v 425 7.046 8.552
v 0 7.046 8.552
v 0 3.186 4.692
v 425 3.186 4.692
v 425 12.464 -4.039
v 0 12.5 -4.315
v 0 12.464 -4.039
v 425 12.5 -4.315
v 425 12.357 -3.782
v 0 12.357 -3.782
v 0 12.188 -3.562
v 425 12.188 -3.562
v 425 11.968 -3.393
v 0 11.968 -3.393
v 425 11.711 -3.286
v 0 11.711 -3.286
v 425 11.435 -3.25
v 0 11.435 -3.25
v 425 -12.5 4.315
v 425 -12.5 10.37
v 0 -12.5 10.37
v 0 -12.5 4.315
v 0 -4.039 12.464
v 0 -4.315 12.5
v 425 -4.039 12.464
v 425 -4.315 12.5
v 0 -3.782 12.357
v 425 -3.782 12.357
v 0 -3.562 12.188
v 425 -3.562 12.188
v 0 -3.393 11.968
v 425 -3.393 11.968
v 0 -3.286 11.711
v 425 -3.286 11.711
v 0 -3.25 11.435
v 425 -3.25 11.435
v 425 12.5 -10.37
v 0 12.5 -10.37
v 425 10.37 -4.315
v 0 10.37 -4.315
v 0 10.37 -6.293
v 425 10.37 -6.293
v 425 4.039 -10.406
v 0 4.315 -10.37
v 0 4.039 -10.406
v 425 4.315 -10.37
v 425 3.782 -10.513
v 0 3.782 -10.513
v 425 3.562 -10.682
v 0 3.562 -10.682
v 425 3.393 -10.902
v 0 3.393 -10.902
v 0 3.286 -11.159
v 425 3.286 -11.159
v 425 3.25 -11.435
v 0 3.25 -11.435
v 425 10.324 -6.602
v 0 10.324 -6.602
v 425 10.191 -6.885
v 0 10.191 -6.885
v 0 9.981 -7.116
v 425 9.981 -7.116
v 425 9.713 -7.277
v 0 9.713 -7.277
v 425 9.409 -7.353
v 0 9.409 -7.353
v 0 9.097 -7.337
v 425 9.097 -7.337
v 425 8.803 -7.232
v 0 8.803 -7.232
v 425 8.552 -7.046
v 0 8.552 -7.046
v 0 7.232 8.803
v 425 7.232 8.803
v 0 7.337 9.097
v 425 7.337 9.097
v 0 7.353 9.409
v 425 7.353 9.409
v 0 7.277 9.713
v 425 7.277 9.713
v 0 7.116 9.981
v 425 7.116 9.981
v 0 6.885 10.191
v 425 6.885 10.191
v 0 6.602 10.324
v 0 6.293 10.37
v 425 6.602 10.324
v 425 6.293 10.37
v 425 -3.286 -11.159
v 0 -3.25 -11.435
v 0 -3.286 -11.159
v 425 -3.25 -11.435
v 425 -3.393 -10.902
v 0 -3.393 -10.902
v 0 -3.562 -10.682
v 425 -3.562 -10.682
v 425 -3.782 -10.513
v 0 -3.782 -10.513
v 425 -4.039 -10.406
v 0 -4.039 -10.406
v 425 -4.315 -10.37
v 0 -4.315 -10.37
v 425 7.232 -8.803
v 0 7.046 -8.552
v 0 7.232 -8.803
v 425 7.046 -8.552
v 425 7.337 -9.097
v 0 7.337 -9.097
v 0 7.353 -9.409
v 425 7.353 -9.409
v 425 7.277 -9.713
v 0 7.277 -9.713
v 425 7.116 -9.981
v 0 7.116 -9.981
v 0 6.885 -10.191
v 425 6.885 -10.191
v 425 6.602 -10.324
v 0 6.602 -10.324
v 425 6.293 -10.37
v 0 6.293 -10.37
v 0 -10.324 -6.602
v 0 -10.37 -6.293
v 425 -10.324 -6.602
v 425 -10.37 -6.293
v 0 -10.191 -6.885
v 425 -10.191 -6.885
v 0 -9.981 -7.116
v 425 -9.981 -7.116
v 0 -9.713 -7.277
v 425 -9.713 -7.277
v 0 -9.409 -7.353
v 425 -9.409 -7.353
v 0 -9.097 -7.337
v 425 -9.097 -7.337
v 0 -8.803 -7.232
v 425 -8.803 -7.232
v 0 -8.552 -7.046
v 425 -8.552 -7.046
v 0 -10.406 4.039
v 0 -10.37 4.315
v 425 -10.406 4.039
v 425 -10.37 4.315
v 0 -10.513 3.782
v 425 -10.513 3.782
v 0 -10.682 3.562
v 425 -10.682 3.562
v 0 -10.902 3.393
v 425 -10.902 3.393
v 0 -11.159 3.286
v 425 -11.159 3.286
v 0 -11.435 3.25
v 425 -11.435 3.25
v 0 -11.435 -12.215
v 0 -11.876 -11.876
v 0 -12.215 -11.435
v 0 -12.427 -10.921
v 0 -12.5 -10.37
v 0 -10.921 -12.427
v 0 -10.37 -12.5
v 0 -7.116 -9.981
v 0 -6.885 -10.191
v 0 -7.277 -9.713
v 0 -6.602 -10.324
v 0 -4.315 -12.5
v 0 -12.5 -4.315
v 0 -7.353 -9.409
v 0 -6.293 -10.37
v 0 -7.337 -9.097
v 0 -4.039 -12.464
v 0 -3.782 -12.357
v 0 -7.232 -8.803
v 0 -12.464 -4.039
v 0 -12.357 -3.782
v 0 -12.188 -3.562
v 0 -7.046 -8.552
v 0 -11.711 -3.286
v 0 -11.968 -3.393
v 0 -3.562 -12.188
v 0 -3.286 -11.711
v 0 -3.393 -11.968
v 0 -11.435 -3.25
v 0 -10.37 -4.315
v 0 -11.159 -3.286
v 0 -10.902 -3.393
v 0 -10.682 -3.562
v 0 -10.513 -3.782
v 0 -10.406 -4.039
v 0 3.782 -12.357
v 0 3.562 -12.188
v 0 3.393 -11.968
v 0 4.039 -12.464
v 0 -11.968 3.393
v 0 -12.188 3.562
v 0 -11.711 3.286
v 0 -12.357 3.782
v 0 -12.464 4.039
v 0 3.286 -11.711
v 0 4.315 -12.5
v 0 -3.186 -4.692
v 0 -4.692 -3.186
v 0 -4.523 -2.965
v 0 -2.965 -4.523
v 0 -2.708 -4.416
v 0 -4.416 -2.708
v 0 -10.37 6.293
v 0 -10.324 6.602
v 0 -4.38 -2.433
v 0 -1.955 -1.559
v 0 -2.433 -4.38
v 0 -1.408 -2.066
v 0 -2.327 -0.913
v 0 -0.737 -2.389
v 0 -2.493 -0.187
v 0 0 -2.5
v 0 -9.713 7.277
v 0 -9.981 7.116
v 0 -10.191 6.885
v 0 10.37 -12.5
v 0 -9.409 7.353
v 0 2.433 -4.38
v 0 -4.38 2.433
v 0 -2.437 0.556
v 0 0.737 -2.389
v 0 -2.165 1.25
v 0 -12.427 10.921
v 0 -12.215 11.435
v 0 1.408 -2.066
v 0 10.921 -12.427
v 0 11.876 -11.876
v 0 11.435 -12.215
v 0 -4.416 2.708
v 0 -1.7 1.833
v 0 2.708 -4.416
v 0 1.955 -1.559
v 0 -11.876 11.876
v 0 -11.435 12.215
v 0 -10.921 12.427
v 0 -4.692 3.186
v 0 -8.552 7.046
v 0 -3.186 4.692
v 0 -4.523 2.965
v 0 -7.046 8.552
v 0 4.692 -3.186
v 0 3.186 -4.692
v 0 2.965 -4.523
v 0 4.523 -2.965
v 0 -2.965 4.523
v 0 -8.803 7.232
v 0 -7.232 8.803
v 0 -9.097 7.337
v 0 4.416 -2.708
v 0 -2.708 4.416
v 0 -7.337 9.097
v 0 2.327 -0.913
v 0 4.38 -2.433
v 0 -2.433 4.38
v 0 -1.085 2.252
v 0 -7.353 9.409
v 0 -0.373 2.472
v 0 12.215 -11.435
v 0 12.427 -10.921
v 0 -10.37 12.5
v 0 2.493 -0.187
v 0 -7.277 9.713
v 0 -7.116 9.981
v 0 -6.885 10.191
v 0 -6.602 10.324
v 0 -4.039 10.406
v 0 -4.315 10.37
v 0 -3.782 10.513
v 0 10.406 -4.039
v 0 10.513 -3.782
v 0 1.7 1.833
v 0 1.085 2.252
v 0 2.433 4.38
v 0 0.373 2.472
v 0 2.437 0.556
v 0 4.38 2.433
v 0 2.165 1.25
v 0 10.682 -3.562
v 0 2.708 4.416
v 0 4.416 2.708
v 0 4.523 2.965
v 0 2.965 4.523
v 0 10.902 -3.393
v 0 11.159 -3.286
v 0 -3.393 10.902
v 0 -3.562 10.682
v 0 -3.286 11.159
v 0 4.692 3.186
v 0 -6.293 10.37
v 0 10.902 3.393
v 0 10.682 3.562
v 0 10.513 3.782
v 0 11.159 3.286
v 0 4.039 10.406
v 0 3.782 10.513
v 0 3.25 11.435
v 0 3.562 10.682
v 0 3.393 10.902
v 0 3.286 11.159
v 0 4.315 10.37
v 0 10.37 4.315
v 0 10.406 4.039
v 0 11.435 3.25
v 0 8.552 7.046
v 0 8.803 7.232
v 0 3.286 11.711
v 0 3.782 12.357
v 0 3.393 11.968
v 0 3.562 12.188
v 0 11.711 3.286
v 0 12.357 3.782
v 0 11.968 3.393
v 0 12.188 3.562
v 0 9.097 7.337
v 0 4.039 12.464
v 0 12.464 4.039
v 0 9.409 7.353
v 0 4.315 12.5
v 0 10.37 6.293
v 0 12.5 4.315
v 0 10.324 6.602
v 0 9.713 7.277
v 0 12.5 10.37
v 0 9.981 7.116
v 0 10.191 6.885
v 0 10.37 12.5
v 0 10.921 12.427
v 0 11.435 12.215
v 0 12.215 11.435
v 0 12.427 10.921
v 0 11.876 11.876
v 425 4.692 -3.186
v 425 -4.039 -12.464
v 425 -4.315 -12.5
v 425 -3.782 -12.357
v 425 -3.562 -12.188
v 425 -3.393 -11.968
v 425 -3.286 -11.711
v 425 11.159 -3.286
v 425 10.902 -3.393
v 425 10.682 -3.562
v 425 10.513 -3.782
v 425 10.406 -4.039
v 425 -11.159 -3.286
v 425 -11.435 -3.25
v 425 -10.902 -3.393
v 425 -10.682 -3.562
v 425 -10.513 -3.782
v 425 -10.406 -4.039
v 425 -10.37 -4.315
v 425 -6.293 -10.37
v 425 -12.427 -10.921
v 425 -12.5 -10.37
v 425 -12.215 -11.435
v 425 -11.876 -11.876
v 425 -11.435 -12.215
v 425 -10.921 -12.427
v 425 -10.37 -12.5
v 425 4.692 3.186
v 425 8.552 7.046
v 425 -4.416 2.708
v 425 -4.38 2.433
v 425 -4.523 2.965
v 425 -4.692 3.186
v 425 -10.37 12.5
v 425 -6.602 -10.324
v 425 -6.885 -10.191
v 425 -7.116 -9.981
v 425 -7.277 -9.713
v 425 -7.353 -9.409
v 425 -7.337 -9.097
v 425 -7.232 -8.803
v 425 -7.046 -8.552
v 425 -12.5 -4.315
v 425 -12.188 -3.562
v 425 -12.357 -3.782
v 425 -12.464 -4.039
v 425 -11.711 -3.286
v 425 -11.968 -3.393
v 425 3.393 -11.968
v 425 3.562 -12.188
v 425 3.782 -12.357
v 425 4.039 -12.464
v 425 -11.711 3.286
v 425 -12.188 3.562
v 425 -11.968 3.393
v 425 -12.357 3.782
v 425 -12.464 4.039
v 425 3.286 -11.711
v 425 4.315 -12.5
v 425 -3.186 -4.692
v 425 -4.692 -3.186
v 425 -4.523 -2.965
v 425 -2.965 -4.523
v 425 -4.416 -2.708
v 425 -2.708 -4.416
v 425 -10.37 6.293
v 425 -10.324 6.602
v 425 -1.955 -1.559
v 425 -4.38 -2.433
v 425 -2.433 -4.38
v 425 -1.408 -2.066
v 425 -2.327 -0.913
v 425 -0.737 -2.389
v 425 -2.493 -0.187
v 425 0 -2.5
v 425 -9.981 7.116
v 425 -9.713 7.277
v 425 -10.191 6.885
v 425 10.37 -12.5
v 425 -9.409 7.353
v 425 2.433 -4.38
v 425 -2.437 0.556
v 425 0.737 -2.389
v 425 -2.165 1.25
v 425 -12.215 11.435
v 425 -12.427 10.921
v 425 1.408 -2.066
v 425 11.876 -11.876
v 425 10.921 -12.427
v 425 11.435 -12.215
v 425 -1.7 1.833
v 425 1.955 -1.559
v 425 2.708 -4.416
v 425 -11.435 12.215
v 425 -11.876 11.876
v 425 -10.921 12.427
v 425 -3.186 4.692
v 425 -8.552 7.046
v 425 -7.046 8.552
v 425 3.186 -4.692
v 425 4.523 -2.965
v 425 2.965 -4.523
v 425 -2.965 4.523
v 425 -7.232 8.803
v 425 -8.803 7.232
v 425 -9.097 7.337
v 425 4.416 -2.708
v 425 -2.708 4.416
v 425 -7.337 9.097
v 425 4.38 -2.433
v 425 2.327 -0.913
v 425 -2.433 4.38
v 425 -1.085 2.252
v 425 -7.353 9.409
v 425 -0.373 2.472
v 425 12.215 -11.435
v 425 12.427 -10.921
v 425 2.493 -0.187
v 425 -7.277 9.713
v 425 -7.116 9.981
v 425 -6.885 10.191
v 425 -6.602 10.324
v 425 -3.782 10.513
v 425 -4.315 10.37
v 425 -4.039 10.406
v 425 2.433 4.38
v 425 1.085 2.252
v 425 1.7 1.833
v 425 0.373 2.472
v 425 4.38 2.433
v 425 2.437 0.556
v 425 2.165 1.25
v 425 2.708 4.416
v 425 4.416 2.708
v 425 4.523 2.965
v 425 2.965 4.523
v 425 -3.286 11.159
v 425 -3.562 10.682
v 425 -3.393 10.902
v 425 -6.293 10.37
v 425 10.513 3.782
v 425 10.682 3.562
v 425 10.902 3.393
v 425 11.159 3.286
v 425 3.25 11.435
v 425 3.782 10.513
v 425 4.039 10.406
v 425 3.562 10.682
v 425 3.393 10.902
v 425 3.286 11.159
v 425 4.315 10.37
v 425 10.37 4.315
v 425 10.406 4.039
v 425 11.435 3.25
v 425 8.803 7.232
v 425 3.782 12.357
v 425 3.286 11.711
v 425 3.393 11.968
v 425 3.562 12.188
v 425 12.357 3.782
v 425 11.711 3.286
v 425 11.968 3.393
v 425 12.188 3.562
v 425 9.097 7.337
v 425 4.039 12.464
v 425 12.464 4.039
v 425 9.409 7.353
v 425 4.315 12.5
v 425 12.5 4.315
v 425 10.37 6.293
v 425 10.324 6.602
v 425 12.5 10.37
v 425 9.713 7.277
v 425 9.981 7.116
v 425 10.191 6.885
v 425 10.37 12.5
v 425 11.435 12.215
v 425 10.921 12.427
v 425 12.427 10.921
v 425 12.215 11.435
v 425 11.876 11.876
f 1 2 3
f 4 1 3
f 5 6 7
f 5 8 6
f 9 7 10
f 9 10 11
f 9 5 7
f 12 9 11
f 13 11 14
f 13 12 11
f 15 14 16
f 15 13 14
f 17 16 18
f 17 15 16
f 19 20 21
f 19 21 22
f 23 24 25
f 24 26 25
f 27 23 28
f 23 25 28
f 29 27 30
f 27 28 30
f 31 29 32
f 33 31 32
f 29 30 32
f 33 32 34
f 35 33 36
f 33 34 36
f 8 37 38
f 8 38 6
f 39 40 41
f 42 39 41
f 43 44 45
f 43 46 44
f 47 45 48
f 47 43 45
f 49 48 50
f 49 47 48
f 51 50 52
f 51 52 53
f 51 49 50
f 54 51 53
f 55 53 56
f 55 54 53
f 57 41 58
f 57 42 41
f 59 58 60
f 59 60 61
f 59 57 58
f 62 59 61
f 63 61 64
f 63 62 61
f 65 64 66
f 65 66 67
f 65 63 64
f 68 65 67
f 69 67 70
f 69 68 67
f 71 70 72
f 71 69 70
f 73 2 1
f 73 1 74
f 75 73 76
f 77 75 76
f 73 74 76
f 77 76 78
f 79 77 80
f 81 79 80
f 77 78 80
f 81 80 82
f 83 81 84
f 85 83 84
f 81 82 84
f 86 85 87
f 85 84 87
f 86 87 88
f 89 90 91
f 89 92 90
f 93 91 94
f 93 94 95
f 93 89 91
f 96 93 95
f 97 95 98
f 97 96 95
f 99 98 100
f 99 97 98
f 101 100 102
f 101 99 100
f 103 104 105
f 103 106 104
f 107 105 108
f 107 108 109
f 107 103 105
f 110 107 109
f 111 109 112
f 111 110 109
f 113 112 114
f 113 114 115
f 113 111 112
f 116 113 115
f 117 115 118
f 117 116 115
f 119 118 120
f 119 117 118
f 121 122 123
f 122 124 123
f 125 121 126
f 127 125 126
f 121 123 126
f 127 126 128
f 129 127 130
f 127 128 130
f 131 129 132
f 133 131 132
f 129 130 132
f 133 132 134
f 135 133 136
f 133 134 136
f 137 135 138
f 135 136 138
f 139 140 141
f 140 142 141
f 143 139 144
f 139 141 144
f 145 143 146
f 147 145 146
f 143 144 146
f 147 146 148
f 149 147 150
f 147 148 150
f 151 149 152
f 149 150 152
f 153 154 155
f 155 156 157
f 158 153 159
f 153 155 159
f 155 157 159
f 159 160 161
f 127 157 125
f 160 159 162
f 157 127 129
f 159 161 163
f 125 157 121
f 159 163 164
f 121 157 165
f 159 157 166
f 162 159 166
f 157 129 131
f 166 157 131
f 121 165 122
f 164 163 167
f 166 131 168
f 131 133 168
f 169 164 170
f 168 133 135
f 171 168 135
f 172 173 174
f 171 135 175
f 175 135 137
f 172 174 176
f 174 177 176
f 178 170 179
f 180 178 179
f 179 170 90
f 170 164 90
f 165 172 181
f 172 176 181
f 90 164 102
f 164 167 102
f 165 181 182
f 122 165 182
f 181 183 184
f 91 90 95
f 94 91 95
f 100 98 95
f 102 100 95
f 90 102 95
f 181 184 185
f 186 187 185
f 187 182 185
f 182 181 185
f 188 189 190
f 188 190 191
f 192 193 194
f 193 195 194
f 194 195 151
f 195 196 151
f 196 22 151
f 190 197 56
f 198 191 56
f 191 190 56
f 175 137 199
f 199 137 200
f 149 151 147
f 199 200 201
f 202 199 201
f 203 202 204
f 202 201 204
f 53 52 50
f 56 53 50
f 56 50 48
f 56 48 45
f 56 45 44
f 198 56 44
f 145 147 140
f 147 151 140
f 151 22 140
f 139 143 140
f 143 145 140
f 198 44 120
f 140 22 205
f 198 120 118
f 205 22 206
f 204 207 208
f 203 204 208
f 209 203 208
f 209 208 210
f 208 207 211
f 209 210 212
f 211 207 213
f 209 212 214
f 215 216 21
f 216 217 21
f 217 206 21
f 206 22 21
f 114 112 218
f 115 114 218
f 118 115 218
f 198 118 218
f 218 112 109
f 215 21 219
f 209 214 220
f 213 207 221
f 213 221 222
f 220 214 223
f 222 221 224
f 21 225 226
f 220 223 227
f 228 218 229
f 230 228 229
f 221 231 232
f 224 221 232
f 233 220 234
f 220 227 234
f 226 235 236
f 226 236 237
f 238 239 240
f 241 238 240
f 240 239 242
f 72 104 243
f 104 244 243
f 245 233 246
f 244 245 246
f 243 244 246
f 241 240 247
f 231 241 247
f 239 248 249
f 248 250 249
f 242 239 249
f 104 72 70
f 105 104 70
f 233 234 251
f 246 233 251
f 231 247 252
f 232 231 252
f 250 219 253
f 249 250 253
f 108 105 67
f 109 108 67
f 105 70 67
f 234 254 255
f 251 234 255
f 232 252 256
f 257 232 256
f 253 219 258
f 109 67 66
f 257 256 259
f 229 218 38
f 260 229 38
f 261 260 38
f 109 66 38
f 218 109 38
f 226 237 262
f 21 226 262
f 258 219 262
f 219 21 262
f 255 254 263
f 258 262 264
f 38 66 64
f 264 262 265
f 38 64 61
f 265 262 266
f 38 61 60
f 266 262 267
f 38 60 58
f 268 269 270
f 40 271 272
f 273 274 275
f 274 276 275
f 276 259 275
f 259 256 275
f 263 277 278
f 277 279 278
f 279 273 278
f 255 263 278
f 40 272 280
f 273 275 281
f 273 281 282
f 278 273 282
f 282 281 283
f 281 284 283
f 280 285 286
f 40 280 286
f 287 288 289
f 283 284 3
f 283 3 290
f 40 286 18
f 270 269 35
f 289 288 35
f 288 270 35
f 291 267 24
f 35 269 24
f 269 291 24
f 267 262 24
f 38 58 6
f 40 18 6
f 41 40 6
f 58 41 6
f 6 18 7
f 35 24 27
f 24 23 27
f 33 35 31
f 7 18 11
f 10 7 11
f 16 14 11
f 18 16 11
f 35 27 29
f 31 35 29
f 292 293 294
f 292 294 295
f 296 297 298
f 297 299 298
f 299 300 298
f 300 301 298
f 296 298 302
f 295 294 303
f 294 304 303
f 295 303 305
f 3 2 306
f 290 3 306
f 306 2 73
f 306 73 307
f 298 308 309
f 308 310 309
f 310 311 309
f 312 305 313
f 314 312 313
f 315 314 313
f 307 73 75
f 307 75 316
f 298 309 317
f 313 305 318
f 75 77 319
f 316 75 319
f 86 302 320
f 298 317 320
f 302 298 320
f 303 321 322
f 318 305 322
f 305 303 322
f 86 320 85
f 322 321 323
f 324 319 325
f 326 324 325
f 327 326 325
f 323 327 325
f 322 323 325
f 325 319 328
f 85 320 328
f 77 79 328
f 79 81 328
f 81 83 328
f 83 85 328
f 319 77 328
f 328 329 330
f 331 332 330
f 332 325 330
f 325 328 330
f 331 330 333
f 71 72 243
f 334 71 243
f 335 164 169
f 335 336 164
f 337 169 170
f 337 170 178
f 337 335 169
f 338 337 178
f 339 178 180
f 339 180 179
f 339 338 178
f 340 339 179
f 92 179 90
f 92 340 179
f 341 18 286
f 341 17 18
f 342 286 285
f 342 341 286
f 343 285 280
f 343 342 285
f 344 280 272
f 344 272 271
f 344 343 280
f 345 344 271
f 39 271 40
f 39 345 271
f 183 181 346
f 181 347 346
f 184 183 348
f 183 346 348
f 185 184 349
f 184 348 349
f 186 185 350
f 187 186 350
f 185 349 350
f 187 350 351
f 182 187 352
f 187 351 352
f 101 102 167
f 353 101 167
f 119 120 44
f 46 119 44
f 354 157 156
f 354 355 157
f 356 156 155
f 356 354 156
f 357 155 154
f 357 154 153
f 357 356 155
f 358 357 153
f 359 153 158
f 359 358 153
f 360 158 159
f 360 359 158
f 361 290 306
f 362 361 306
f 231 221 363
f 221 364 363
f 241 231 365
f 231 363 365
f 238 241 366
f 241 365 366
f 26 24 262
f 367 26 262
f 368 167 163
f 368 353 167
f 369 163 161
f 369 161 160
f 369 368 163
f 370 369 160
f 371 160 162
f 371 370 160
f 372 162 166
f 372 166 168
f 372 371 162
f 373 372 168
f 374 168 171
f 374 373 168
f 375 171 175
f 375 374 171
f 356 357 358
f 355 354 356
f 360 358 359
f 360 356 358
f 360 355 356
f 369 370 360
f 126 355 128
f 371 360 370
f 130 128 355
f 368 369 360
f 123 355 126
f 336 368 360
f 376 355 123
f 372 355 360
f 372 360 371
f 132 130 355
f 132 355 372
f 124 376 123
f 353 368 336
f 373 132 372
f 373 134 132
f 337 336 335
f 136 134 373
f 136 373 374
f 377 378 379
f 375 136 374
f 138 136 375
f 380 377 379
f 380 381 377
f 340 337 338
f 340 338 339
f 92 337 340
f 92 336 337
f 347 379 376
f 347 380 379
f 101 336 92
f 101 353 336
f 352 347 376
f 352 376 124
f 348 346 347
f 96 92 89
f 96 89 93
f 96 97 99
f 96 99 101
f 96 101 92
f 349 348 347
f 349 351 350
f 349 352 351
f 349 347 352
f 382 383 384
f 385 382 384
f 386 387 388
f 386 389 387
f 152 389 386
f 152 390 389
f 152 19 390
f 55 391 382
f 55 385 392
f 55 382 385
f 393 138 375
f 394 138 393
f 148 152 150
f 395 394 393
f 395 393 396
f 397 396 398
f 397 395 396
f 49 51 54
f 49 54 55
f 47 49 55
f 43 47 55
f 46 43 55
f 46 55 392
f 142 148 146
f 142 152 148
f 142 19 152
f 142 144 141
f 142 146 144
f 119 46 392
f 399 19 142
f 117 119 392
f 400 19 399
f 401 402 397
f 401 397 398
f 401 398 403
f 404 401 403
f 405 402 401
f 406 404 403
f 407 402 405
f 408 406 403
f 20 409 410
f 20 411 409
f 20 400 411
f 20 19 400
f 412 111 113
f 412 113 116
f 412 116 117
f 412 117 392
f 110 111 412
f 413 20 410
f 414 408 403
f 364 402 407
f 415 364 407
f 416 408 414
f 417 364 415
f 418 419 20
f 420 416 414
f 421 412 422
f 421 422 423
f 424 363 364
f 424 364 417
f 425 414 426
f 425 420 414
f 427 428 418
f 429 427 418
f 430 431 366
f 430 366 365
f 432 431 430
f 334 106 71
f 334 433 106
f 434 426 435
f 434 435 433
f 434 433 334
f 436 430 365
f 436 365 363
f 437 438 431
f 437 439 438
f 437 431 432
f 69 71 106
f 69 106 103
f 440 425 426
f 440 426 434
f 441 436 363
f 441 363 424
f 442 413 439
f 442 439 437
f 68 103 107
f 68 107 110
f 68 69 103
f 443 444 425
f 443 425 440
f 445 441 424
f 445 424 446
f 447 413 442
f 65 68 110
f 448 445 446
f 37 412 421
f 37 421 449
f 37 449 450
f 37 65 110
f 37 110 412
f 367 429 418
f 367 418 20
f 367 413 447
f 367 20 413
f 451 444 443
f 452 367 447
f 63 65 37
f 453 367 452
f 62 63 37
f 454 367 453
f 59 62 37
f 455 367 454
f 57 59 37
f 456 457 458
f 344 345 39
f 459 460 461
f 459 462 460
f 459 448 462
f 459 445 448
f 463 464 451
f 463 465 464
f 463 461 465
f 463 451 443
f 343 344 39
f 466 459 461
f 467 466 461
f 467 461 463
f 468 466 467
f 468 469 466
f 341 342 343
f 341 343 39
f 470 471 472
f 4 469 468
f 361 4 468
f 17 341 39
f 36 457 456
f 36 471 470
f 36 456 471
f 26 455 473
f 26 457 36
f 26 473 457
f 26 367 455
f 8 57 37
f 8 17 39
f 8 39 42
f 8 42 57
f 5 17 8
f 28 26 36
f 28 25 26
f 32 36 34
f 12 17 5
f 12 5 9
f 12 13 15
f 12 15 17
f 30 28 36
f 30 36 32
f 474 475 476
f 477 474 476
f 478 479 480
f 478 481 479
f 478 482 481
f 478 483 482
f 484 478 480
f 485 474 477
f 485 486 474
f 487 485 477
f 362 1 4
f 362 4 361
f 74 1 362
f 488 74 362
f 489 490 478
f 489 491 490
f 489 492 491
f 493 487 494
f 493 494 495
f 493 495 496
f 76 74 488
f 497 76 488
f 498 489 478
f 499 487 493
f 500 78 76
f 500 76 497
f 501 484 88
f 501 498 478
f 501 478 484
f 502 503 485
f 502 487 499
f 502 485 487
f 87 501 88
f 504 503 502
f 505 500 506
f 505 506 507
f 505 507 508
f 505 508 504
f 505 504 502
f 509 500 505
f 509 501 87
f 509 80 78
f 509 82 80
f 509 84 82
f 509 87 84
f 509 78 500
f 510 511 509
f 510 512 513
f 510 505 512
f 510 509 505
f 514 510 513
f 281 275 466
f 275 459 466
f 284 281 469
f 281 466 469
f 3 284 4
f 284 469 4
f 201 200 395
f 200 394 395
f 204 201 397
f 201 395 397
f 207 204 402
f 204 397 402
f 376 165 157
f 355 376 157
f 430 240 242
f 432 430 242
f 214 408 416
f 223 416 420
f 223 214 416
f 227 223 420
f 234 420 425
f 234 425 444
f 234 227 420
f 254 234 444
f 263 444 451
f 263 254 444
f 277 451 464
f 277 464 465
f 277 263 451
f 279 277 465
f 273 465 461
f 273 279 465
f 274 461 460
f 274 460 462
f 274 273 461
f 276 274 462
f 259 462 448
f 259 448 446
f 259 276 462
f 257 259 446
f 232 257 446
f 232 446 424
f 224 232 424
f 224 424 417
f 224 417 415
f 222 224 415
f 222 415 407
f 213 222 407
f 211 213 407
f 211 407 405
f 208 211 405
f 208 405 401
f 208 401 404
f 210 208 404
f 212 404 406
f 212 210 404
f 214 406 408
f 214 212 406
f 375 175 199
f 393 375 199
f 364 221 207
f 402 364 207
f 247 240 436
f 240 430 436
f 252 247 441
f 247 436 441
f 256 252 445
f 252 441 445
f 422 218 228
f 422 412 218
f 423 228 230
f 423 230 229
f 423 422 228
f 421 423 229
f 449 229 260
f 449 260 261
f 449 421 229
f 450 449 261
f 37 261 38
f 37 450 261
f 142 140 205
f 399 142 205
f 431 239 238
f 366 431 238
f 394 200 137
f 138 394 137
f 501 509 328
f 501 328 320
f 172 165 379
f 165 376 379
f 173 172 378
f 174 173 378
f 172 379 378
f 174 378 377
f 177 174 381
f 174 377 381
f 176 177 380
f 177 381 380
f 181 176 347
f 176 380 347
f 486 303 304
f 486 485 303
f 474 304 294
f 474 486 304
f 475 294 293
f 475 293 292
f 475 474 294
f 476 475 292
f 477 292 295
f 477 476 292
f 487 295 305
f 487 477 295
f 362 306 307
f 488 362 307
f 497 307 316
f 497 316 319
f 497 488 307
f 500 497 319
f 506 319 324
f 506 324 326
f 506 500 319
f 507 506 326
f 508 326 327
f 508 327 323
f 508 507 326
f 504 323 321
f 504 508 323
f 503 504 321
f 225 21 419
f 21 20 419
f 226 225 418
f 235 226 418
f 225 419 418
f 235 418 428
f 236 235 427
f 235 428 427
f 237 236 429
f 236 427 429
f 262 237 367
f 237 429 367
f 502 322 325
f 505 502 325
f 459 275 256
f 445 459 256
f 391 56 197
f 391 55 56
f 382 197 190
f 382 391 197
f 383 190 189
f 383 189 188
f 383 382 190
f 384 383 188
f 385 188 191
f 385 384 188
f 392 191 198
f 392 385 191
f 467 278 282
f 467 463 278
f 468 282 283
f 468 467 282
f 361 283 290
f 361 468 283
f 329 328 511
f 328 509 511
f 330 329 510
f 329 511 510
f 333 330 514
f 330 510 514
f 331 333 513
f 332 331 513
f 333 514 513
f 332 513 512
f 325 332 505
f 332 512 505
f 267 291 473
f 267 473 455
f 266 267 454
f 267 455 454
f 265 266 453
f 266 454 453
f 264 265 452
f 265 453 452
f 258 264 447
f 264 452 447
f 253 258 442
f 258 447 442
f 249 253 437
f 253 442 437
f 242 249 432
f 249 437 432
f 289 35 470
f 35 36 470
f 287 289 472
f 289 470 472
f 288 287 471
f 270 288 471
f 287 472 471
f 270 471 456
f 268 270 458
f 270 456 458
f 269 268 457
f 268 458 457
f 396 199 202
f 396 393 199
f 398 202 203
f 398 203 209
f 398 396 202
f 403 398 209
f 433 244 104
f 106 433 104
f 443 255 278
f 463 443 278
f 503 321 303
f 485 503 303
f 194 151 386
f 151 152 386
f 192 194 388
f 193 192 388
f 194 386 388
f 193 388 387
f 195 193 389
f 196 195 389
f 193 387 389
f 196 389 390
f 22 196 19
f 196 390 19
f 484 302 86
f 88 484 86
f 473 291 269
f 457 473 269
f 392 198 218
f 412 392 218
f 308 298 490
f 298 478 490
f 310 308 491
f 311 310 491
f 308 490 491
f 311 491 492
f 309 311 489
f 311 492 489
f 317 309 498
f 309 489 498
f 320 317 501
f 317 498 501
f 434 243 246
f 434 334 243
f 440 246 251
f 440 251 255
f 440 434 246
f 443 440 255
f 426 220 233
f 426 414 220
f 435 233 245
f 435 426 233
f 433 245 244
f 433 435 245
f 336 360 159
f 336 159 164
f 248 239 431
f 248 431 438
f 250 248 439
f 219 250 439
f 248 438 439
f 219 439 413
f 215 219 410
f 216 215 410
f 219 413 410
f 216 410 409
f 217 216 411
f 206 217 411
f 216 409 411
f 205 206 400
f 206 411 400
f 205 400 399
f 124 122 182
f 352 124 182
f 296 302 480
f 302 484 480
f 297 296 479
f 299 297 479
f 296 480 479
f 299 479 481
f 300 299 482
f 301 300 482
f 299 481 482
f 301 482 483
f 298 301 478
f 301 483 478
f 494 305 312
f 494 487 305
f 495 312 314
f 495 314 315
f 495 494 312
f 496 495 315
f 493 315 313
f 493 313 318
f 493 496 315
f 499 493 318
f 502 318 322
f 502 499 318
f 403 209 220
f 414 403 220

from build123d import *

# Parameters (mm, degrees)
SKETCH1_R           = 2.5
BOSS_EXTRUDE1_DEPTH = 425
FILLET1_R           = 1.065
FILLET2_R           = 2.13


with BuildPart() as part:
    # Sketch1 → Boss-Extrude1 (new body)
    with BuildSketch(Plane.YZ):
        Polygon((-12.5, -3.25), (-12.5, -12.5), (-3.25, -12.5), (-3.25, -10.37), (-8.863862556, -10.37), (-2.873862556, -4.38), (2.873862556, -4.38), (8.863862556, -10.37), (3.25, -10.37), (3.25, -12.5), (12.5, -12.5), (12.5, -3.25), (10.37, -3.25), (10.37, -8.863862556), (4.38, -2.873862556), (4.38, 2.873862556), (10.37, 8.863862556), (10.37, 3.25), (12.5, 3.25), (12.5, 12.5), (3.25, 12.5), (3.25, 10.37), (8.863862556, 10.37), (2.873862556, 4.38), (-2.873862556, 4.38), (-8.863862556, 10.37), (-3.25, 10.37), (-3.25, 12.5), (-12.5, 12.5), (-12.5, 3.25), (-10.37, 3.25), (-10.37, 8.863862556), (-4.38, 2.873862556), (-4.38, -2.873862556), (-10.37, -8.863862556), (-10.37, -3.25), align=None)
        with Locations(Location((0, 0, 0), (0, 0, 270))):
            Circle(SKETCH1_R, mode=Mode.SUBTRACT)
    extrude(amount=BOSS_EXTRUDE1_DEPTH)

    # Fillet1
    fillet1_edges = [part.edges().sort_by_distance(p)[0] for p in [
        (212.5, -10.37, -8.863862556),
        (212.5, 2.873862556, -4.38),
        (212.5, -2.873862556, -4.38),
        (212.5, -4.38, 2.873862556),
        (212.5, -4.38, -2.873862556),
        (212.5, -2.873862556, 4.38),
        (212.5, 2.873862556, 4.38),
        (212.5, 4.38, 2.873862556),
        (212.5, 4.38, -2.873862556),
        (212.5, -8.863862556, -10.37),
        (212.5, 8.863862556, -10.37),
        (212.5, 10.37, -8.863862556),
        (212.5, -10.37, 8.863862556),
        (212.5, -8.863862556, 10.37),
        (212.5, 10.37, 8.863862556),
        (212.5, 8.863862556, 10.37),
        (212.5, 12.5, 3.25),
        (212.5, -3.25, -12.5),
        (212.5, -10.37, 3.25),
        (212.5, 10.37, 3.25),
        (212.5, -10.37, -3.25),
        (212.5, -12.5, -3.25),
        (212.5, -12.5, 3.25),
        (212.5, 3.25, -10.37),
        (212.5, -3.25, -10.37),
        (212.5, 3.25, -12.5),
        (212.5, 10.37, -3.25),
        (212.5, 12.5, -3.25),
        (212.5, 3.25, 12.5),
        (212.5, 3.25, 10.37),
        (212.5, -3.25, 10.37),
        (212.5, -3.25, 12.5),
    ]]
    fillet(fillet1_edges, radius=FILLET1_R - 0.0001)  # a hair under: the kernel refuses the full size

    # Fillet2
    fillet2_edges = [part.edges().sort_by_distance(p)[0] for p in [
        (212.5, -12.5, 12.5),
        (212.5, 12.5, 12.5),
        (212.5, 12.5, -12.5),
        (212.5, -12.5, -12.5),
    ]]
    fillet(fillet2_edges, radius=FILLET2_R)


solid = part.part
